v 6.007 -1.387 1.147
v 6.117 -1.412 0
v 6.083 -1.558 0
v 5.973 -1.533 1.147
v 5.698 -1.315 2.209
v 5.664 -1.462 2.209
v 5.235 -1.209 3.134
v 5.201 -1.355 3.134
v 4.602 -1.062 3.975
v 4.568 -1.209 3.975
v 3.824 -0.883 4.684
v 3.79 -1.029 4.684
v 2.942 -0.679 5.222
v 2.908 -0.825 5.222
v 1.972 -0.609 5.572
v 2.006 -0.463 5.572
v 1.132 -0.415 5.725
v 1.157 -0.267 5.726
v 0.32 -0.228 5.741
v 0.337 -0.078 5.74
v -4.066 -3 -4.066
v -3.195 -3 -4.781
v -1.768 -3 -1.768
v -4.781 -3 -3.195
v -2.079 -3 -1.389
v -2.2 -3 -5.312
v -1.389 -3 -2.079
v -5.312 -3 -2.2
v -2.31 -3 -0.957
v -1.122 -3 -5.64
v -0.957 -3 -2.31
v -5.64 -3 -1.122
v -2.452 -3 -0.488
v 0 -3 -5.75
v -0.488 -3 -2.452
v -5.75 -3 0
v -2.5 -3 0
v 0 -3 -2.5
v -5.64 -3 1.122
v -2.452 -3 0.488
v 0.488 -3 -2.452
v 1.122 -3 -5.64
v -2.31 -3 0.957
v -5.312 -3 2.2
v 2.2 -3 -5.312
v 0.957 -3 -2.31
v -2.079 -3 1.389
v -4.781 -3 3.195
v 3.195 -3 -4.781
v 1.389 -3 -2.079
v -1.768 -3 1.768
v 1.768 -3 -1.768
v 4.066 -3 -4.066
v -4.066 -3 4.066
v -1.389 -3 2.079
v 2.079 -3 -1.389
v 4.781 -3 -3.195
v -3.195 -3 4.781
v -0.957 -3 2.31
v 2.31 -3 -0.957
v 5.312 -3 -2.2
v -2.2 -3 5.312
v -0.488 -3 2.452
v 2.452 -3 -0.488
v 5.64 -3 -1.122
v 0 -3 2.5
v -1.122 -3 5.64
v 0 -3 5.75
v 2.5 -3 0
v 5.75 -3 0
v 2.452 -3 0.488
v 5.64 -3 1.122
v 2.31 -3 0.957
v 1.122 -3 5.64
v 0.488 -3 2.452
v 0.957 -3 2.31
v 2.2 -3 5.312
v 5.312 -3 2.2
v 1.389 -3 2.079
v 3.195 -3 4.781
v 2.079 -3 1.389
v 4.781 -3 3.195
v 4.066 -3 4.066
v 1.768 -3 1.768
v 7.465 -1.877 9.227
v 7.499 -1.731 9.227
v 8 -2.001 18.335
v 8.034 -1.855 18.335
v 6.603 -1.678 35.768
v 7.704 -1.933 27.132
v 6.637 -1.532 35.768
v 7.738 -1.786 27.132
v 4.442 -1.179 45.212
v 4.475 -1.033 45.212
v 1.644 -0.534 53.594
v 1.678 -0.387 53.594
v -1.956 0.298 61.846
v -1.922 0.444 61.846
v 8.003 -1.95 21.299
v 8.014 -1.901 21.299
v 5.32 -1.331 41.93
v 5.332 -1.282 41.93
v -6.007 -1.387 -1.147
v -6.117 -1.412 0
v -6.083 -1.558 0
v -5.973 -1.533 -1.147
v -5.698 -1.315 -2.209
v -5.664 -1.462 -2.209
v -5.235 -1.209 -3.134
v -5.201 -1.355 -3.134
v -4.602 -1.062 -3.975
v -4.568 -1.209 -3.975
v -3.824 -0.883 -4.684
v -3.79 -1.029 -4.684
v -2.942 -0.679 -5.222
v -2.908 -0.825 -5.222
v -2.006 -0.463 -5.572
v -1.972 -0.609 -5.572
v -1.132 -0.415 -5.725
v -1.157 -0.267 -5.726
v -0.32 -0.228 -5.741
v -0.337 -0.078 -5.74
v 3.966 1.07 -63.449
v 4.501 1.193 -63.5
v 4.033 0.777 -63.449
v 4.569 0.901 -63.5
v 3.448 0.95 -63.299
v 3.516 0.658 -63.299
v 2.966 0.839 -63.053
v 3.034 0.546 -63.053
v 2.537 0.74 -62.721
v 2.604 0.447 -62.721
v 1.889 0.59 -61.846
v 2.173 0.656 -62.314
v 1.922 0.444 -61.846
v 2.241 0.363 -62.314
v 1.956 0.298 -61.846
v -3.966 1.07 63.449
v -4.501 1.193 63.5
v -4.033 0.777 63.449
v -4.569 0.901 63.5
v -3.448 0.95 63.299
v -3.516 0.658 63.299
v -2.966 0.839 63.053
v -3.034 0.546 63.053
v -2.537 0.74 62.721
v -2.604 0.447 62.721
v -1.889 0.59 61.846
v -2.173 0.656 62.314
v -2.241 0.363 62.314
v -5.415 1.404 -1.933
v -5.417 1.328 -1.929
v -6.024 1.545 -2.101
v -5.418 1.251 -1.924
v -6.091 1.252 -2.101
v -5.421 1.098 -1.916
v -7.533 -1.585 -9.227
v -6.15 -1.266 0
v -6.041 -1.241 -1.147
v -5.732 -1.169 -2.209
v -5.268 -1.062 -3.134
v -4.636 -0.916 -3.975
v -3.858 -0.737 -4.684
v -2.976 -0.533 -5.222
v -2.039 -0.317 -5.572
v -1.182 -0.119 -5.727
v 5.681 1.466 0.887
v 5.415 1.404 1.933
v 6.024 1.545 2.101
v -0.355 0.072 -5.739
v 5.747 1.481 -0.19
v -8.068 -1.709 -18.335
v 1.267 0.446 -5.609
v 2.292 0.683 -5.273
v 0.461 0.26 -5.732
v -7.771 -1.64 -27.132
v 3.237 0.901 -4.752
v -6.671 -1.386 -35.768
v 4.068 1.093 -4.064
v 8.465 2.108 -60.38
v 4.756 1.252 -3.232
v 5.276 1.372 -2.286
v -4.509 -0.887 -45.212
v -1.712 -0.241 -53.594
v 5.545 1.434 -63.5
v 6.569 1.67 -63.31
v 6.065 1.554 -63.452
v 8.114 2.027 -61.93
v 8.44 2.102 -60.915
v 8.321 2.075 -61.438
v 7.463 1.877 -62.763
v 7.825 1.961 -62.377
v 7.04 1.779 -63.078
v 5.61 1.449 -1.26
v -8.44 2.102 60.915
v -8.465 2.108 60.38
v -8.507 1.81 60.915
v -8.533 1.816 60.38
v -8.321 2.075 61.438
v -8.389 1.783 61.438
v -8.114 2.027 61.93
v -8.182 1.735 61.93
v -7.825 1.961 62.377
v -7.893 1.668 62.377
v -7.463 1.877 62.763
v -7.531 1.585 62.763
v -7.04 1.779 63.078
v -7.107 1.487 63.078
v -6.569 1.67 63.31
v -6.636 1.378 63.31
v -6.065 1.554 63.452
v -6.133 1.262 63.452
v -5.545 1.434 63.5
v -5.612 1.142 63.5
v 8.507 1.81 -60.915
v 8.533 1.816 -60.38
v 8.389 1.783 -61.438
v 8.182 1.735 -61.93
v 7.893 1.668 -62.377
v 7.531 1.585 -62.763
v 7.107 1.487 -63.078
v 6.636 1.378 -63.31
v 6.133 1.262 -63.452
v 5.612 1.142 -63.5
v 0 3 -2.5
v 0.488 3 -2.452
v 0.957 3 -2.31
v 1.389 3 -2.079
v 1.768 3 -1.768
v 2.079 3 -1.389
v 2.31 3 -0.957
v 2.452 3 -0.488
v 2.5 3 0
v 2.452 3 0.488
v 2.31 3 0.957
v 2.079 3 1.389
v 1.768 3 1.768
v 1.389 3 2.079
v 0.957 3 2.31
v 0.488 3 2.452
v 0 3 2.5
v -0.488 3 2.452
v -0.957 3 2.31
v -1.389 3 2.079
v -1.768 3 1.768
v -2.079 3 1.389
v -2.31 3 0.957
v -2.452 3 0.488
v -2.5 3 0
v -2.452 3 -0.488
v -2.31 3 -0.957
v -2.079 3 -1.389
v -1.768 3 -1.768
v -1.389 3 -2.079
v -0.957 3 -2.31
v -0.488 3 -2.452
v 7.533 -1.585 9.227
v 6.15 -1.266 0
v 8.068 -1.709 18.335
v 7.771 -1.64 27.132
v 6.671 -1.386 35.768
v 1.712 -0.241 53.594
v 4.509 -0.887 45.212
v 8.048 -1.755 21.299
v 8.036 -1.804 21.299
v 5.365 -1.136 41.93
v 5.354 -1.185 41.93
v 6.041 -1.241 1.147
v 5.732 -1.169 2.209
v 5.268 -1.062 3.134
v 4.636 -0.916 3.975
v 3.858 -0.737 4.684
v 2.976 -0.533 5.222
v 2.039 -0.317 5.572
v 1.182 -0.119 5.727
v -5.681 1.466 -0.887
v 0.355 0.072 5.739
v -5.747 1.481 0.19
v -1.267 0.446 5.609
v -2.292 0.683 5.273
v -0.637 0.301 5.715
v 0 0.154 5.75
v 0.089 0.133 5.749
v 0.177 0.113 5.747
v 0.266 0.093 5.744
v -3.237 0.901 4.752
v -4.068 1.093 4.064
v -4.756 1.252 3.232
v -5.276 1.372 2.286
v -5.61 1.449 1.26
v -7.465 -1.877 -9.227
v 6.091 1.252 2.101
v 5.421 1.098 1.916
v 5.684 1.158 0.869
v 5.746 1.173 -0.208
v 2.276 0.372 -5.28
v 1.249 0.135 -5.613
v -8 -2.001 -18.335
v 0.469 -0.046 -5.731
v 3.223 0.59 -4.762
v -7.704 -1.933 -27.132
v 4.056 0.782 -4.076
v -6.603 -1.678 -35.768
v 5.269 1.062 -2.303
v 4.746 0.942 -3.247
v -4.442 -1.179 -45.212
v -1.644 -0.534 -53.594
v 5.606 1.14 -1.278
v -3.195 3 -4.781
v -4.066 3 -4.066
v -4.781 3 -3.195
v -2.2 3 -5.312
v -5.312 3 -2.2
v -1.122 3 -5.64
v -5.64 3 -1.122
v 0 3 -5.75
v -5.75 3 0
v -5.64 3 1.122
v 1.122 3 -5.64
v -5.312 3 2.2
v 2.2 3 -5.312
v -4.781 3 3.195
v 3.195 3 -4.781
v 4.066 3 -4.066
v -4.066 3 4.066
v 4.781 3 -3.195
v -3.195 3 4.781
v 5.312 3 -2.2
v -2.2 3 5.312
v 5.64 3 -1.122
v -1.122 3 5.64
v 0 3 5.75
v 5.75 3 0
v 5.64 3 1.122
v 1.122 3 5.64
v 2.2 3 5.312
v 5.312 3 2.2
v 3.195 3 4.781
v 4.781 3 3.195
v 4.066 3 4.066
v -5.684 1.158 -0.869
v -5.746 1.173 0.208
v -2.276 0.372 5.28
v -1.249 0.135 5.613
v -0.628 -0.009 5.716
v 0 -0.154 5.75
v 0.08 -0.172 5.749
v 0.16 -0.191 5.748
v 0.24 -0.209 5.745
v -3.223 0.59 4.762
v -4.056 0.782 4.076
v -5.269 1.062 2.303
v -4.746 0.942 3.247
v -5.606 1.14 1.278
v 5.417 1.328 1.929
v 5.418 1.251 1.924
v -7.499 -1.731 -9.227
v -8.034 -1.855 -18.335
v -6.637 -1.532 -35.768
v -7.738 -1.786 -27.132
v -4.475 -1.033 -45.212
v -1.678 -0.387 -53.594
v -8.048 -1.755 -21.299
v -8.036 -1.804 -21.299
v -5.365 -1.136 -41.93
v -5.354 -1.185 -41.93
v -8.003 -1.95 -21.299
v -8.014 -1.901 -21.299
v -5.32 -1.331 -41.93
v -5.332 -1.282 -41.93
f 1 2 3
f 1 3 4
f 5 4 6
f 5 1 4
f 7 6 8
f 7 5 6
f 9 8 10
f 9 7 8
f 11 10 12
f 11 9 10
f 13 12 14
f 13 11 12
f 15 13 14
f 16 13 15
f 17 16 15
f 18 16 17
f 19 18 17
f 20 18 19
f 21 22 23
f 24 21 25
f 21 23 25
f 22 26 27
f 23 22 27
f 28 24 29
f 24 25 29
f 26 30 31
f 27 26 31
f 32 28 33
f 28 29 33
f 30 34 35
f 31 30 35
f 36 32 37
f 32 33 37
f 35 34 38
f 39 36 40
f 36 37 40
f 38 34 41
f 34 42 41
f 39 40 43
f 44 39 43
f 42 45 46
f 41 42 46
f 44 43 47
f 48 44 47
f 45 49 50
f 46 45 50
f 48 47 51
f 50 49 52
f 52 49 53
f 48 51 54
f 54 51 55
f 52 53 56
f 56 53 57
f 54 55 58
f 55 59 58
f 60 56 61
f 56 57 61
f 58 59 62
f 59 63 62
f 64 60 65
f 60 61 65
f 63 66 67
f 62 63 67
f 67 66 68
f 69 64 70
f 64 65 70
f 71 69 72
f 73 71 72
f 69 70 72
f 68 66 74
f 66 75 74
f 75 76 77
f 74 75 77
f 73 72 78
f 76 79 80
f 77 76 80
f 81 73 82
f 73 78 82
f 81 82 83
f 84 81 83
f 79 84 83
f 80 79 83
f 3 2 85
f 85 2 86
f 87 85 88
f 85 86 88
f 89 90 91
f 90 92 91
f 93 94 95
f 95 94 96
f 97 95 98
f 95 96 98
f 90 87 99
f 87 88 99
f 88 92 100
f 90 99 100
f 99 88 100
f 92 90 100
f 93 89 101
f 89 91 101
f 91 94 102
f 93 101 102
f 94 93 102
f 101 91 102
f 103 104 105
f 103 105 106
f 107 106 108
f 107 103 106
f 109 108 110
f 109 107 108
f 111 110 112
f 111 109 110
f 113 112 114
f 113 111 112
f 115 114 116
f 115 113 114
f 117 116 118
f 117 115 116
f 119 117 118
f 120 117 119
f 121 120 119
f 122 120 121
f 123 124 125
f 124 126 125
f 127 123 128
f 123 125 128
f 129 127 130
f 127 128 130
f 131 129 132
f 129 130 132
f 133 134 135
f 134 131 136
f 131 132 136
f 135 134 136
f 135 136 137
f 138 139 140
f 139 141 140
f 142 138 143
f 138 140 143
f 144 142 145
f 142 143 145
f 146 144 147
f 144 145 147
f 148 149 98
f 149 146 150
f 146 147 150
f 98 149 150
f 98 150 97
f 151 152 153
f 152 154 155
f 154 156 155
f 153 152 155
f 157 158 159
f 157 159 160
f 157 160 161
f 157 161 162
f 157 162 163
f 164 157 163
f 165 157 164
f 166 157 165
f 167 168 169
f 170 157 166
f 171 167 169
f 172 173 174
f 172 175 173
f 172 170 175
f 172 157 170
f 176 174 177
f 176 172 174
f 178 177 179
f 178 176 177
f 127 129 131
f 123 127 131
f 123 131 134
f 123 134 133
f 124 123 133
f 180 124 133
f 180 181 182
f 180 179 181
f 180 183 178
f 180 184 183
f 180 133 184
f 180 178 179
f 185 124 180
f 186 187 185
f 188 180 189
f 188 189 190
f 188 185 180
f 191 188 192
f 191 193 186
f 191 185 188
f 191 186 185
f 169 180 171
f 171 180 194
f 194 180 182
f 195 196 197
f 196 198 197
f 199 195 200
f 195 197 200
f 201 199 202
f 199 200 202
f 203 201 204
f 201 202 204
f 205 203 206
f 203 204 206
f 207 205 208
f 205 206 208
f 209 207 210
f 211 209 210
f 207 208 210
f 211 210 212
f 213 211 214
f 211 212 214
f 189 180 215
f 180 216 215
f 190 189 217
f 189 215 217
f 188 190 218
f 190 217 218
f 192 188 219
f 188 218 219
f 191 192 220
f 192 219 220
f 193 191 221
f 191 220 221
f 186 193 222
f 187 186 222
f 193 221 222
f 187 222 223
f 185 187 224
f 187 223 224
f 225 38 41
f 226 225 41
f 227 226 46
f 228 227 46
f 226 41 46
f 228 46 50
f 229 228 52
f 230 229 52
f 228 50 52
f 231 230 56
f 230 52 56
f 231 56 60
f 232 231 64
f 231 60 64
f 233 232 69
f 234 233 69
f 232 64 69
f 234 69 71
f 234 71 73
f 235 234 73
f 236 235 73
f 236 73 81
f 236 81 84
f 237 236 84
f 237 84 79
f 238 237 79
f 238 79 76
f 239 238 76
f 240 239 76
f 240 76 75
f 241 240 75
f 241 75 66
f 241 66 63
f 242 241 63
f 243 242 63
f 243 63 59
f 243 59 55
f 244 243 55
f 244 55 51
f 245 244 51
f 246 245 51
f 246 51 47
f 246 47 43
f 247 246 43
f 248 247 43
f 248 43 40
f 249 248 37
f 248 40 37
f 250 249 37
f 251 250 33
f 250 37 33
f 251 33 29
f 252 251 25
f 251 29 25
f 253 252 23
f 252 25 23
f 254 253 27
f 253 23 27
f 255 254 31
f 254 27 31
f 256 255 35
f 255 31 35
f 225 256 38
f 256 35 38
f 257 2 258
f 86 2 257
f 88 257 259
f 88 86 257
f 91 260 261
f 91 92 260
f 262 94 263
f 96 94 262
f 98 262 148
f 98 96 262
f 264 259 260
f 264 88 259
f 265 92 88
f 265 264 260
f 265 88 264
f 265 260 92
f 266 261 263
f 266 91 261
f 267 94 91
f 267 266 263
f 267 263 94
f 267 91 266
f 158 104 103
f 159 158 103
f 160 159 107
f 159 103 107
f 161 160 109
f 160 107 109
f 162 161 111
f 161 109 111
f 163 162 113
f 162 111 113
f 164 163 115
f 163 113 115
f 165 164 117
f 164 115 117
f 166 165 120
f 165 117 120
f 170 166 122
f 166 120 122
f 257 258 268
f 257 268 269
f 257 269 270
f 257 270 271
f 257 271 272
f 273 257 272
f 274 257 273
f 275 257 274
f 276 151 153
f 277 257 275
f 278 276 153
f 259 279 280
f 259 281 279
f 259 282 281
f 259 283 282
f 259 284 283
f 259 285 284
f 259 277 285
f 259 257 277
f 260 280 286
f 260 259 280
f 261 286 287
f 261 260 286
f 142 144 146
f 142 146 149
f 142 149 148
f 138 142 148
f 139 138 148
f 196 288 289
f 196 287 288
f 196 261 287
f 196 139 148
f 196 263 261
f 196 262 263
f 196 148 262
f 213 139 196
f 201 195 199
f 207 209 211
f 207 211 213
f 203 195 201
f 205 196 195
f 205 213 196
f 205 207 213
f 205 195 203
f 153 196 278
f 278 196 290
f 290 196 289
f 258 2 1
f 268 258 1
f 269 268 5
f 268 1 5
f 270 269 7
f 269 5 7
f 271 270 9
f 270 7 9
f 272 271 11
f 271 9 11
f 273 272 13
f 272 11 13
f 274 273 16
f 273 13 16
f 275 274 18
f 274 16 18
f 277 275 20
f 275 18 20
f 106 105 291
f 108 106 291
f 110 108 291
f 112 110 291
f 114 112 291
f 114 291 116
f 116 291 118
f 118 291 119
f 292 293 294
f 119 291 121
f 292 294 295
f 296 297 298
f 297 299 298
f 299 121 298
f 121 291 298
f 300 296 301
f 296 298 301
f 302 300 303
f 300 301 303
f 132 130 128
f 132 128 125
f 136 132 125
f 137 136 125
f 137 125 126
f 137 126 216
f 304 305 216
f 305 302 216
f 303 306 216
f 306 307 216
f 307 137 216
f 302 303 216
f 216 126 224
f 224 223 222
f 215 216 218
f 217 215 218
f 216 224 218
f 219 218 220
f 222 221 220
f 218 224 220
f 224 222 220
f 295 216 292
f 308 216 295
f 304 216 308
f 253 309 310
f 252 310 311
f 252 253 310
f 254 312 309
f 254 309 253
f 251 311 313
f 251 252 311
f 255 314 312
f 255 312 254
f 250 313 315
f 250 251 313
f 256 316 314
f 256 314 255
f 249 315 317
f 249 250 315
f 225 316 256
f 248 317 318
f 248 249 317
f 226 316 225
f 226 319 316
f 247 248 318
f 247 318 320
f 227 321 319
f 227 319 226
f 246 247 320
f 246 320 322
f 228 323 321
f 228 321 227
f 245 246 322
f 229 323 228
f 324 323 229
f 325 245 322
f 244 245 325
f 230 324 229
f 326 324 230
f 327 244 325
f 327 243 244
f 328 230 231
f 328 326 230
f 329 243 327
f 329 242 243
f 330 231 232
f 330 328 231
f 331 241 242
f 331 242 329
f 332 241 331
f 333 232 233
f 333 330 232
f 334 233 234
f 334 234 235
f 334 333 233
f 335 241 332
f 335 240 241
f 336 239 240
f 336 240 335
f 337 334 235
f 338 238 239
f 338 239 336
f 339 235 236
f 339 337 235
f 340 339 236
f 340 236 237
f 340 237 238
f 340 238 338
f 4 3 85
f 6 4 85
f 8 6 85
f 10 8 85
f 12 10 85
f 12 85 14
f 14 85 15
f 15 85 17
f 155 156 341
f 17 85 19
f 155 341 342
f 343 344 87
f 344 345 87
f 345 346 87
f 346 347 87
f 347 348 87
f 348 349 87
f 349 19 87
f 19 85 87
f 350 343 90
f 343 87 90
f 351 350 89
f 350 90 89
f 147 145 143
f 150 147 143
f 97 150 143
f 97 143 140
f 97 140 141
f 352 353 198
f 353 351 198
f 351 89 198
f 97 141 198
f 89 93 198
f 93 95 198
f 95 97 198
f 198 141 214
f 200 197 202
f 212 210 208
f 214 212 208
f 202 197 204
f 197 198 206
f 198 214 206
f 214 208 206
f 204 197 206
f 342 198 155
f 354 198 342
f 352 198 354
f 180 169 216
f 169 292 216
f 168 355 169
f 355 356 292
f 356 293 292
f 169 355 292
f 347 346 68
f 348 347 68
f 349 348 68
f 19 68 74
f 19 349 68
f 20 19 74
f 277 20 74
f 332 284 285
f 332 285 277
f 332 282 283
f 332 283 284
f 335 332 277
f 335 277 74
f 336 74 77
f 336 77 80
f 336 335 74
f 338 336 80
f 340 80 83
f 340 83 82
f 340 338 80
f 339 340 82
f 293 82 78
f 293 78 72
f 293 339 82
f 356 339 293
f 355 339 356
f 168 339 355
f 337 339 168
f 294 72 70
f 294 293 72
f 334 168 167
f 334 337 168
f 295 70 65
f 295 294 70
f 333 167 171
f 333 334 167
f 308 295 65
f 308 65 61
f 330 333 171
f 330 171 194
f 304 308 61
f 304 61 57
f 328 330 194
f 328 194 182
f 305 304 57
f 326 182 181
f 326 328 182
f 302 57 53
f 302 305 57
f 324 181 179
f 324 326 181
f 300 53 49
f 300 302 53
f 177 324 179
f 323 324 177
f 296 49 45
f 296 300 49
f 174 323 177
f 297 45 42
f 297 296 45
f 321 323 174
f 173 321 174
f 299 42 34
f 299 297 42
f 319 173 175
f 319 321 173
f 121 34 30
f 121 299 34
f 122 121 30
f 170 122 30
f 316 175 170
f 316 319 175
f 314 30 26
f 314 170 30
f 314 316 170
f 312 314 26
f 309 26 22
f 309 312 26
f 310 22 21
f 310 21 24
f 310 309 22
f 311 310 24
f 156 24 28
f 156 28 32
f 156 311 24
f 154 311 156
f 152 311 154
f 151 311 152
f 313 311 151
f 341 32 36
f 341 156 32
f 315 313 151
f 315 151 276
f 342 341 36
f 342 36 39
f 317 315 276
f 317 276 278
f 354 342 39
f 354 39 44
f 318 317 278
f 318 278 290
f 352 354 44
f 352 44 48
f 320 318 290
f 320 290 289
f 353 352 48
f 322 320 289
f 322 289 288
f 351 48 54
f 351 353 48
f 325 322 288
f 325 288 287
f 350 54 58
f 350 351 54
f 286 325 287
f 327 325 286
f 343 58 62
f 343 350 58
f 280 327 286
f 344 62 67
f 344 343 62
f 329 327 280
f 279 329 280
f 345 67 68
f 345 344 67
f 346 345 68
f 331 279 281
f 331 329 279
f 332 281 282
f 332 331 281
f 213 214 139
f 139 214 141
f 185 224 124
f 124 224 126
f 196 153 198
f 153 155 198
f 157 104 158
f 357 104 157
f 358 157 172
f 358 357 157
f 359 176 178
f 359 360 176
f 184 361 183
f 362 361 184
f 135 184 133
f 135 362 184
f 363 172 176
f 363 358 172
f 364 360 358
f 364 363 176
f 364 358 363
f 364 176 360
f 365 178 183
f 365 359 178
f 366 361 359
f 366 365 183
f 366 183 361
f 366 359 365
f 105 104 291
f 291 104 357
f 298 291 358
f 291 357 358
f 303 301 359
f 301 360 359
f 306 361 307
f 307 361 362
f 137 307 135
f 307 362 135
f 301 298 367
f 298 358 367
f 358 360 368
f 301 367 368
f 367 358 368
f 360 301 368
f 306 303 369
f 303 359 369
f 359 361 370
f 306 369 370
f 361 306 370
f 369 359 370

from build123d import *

# Parameters (mm, degrees)
SKETCH1_R           = 5.75
BOSS_EXTRUDE1_DEPTH = 3
BOSS_EXTRUDE2_DEPTH = 0.15
CIRPATTERN1_COUNT   = 2
SKETCH4_R           = 2.5
CUT_EXTRUDE1_DEPTH  = 65.351390501


with BuildPart() as part:
    # Sketch1 → Boss-Extrude1 (new, symmetric)
    with BuildSketch(Plane(origin=(0, 0, 0), x_dir=(1, 0, 0), z_dir=(0, 1, 0))):
        with Locations(Location((0, 0, 0), (0, 0, 270))):
            Circle(SKETCH1_R)
    extrude(amount=BOSS_EXTRUDE1_DEPTH, both=True)

    # Sketch3 → Boss-Extrude2 (add, symmetric)
    with BuildSketch(Plane(origin=(0, 0, 0), x_dir=(0.9743700647852351, -0.22495105434386545, 0), z_dir=(-0.22495105434386545, -0.9743700647852351, 0))):
        with BuildLine():
            Line((-4.681329955, -1.686621276), (-6.216630979, -2.101445918))
            Line((-6.216630979, -2.101445918), (-8.722778735, 60.379765414))
            ThreePointArc((-8.722778735, 60.379765414), (-7.888601188, 62.578376319), (-5.725189096, 63.5))
            Line((-5.725189096, 63.5), (-4.654387641, 63.5))
            ThreePointArc((-4.654387641, 63.5), (-3.079032897, 63.053087823), (-1.973041632, 61.845504954))
            add(Edge.make_bspline(
                [(6.277481036, 0), (10.594464488, 21.617209899), (7.832639592, 42.304570426), (-1.973041632, 61.845504954)],
                knots=[0, 0, 0, 0, 0.972510394, 0.972510394, 0.972510394, 0.972510394], degree=3))
            add(Edge.make_bspline(
                [(6.277481036, 0), (6.277481036, 6.676569572), (-0.15603138, 5.686416632), (-6.589543796, 4.696263693), (-4.681329955, -1.686621276)],
                knots=[4.71238898, 4.71238898, 4.71238898, 6.432037026, 6.432037026, 8.151685071, 8.151685071, 8.151685071], degree=2, weights=[1, 0.652570821, 1, 0.652570821, 1]))
        make_face()
    boss_extrude2 = extrude(amount=BOSS_EXTRUDE2_DEPTH, both=True)

    # CirPattern1: Boss-Extrude2 ×2 about axis
    cirpattern1_axis = Axis((0, 3, 0), (0, -1, 0))
    for i in range(1, CIRPATTERN1_COUNT):
        add(boss_extrude2.rotate(cirpattern1_axis, i * 360 / CIRPATTERN1_COUNT))

    # Sketch4 → Cut-Extrude1 (cut, through all)
    with BuildSketch(Plane.XZ.offset(3)):
        with Locations(Location((0, 0, 0), (0, 0, 270))):
            Circle(SKETCH4_R)
    extrude(amount=-CUT_EXTRUDE1_DEPTH, mode=Mode.SUBTRACT)


solid = part.part
